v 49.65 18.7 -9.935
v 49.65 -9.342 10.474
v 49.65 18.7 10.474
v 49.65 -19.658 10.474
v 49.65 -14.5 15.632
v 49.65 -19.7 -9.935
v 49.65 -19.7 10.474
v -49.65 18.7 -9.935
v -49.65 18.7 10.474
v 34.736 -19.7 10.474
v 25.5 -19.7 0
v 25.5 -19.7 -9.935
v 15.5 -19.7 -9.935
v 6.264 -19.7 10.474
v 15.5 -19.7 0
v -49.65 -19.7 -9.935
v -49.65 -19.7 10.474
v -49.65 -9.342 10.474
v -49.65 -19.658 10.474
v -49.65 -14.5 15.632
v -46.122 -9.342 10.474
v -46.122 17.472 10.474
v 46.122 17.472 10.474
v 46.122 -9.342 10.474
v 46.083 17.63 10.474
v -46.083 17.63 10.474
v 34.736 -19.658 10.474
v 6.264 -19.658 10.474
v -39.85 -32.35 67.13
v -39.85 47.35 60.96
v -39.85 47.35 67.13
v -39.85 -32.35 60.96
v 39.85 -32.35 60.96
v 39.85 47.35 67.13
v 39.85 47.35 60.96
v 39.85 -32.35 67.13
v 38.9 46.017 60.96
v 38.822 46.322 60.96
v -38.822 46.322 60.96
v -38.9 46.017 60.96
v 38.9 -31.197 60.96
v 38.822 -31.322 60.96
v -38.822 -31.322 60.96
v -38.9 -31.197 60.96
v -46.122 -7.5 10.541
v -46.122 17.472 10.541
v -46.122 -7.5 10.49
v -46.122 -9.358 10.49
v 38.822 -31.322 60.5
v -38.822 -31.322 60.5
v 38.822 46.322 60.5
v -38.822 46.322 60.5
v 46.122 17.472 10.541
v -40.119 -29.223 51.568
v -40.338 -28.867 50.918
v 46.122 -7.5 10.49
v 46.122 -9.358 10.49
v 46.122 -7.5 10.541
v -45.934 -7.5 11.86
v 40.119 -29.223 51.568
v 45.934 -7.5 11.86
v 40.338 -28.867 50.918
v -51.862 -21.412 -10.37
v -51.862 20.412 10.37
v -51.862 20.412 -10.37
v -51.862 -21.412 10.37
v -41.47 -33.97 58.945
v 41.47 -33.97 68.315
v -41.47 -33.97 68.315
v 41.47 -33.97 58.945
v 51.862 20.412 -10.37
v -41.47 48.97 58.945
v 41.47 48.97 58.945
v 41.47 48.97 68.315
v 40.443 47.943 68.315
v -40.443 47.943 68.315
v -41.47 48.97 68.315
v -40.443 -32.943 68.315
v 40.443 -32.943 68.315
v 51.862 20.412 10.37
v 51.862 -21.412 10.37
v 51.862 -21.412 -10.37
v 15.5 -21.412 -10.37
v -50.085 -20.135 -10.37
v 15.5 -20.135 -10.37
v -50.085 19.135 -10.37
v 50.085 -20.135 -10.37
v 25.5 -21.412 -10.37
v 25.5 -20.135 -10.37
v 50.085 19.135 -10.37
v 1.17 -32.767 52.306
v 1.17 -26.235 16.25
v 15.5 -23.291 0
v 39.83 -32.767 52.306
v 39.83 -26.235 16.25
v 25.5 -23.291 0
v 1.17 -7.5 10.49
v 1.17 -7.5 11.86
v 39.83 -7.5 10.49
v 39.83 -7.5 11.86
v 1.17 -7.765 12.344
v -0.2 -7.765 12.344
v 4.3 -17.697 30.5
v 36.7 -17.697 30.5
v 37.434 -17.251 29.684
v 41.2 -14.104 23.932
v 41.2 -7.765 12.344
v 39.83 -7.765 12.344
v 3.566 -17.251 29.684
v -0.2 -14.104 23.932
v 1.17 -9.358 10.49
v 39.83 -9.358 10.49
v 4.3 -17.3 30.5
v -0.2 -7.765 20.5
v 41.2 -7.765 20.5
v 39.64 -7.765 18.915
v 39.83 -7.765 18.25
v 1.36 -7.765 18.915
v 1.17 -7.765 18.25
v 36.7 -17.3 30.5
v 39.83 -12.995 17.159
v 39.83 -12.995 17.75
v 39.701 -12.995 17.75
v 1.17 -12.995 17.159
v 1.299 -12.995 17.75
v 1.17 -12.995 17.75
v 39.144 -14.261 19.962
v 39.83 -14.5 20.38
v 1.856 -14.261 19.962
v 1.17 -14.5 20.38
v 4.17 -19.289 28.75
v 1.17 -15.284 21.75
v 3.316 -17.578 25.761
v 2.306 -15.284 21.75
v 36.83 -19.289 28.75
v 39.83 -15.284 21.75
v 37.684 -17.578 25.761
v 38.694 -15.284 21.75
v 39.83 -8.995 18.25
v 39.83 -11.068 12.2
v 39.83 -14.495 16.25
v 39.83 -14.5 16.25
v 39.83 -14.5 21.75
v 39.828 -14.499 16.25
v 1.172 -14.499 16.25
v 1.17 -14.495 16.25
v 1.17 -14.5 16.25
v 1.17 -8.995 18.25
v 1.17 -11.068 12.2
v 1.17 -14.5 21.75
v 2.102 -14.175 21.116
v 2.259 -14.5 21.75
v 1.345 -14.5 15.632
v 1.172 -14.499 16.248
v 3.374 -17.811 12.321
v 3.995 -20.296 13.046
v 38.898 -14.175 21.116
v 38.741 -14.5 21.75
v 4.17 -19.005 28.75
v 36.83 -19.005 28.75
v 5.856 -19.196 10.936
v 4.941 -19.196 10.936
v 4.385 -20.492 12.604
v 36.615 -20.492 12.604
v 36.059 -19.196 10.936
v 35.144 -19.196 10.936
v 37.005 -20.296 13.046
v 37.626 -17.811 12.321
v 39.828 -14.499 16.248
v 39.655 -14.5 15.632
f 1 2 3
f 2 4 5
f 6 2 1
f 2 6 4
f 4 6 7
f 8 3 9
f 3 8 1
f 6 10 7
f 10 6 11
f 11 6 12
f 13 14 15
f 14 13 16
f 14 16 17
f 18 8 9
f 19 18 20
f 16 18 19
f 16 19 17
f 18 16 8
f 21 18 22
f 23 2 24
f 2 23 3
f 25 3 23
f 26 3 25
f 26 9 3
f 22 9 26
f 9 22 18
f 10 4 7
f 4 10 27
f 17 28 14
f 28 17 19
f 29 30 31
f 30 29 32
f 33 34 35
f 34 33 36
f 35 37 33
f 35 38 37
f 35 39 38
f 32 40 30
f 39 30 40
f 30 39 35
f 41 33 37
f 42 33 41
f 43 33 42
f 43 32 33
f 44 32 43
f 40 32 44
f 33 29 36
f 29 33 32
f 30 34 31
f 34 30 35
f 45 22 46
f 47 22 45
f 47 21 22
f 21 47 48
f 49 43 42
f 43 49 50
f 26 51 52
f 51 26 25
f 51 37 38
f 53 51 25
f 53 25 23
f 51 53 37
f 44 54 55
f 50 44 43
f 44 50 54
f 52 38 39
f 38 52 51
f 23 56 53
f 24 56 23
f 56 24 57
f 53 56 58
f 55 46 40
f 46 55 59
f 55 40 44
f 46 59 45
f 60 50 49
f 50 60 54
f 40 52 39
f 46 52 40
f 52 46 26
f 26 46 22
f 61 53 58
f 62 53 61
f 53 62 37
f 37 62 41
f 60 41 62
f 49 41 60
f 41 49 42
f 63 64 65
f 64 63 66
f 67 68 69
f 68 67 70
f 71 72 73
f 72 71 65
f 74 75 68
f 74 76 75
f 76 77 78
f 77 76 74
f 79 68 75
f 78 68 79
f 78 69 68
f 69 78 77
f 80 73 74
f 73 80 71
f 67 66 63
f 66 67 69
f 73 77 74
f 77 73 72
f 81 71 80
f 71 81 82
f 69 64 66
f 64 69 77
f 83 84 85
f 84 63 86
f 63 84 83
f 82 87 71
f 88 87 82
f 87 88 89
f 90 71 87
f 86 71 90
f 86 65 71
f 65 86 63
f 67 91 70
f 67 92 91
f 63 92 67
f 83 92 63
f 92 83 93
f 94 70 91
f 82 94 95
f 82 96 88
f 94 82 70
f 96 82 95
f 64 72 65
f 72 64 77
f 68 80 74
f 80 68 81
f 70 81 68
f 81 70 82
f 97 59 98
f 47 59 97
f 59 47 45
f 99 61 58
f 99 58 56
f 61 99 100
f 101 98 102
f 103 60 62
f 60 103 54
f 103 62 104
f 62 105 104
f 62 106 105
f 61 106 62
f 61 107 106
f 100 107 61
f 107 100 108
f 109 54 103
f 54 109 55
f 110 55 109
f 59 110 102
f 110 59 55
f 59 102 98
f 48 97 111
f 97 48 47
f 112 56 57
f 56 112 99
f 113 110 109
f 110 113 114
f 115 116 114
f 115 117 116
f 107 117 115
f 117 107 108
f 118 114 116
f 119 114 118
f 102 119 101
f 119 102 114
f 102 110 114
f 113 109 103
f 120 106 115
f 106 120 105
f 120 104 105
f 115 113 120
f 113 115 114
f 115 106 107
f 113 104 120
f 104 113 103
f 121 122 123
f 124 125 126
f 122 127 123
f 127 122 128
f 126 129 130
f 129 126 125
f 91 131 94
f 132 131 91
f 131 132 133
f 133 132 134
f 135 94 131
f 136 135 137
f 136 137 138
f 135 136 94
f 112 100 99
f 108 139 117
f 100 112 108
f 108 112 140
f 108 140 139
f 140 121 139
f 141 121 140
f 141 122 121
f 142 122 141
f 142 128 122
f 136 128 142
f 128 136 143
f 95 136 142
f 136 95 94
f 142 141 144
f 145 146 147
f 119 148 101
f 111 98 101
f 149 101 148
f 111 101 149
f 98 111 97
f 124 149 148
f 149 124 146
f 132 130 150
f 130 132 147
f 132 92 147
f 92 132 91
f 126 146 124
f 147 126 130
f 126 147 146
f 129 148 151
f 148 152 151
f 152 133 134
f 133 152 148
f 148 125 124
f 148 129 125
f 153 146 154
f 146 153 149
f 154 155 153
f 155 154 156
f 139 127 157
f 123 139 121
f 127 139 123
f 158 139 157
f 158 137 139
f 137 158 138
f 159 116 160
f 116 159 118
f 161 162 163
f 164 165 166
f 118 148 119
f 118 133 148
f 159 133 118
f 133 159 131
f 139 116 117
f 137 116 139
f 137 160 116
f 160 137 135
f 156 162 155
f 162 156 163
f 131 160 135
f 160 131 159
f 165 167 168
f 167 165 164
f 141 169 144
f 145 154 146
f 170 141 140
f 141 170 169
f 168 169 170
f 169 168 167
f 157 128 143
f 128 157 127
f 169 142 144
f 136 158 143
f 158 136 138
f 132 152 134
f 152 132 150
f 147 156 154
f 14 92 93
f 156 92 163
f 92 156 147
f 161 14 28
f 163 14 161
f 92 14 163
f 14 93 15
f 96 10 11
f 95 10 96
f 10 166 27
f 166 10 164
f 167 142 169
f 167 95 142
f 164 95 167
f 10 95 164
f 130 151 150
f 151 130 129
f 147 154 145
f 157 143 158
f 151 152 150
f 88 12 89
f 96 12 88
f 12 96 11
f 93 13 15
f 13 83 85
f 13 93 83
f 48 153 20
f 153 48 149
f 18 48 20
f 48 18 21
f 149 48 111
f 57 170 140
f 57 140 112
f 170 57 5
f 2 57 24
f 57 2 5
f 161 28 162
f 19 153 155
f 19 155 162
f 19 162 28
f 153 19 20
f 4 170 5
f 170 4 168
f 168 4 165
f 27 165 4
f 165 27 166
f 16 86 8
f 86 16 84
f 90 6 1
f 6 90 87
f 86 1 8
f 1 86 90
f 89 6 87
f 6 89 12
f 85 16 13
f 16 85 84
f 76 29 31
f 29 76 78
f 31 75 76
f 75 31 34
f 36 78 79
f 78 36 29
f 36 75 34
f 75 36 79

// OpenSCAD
// v620 Multi-Fan Shroud
// By WolfOne_
//
// Print: 80mm rotates 180° (slot down). 40mm no rotation (fan face down).
// Card: use_v340l selects V340L slot sizing (V620 by default).

use_dual_40  		 = 0;   // 0=single 80mm, 1=dual 40mm (locks 90°, ignores others)
use_45deg    		 = 0;   // 0=off, 1=45° fan angle (80mm only)
use_60deg    		 = 0;   // 0=off, 1=60° fan angle (80mm only)
use_75deg    		 = 0;   // 0=off, 1=75° fan angle (80mm only)
use_90deg    		 = 1;   // 0=off, 1=90° fan angle (80mm only)
use_flip     		 = 0;   // 0=normal, 1=mirrored (80mm only)
use_cable_shroud = 1;   // 0=off, 1=shroud over cable opening
use_v340l        = 0;   // 0=V620 (tested), 1=V340L slot sizing

wallThickness = 1.37;

// Card slot (GPU fit)
// V620: as built, card-tested. V340L: the cavity grips the cooler shroud
// while the wider PCB edge passes through a relief band in the cavity wall
// (see Card opening).
v340l_cavityWidth  = 97;  // cavity width (cooler shroud grip)
v340l_cavityHeight = 39.3;  // cavity height (backplate face to slot top)
v340l_pcbWidth     = 98.8;  // PCB relief band width
v340l_pcbStart     = 2.6;   // PCB underside above backplate face
v340l_pcbThk       = 1.7;   // PCB thickness
v340l_pcbRelief    = 1.2;   // extra relief height around the PCB band (total)
v340l_ductTop      = 0.4;   // duct mouth: capture at the top edge
v340l_ductBottom   = 2.5;   // duct mouth: cut at the bottom edge

innerWidth  = use_v340l ? v340l_cavityWidth : 99.3;   // V620: measured 99.5, modeled 99.3
innerDepth  = 18;
innerHeight = use_v340l ? v340l_cavityHeight : 38.4;  // V620 cavity height

// Airflow duct (flow path only)
innerDuctWidth  = innerWidth - (use_v340l ? 1 : 5);   // V620: 94.3 (-5mm total / -2.5mm per side), V340L much thinner shroud
innerDuctHeight = innerHeight - 0.4   // V620: 38
    - (use_v340l ? v340l_ductBottom - v340l_ductTop : 0);  // V340L: mouth shortened at the bottom
ductLiftZ       = use_v340l ? (v340l_ductBottom + v340l_ductTop) / 2 : 0;  // duct mouth center lift

// Derived from flags
fan_size  = use_dual_40 ? 40 : 80;
fan_angle = use_dual_40 ? 90 : (use_90deg ? 90 : (use_75deg ? 75 : (use_60deg ? 60 : 45)));
use_steep = use_75deg || use_90deg;  // ramp adjustments for steep angles
flip      = use_dual_40 ? 0  : use_flip;

fanWidth = 79.7;

// Fan depth: 80mm=8, 40mm=20
fanHeight = use_dual_40 ? 14 : 8;

// Fan offset per angle.
fanOffSet = use_dual_40
    ? [0, -64, 0]
    : (use_90deg
        ? [0, -65,   8 * (flip == 0 ? 1 : -1)]   // 90°
        : (use_75deg
            ? [0, -65,   8 * (flip == 0 ? 1 : -1)]   // 75°
            : (use_60deg
                ? [0, -63,  12 * (flip == 0 ? 1 : -1)]   // 60°
                : [0,  -63,  10 * (flip == 0 ? 1 : -1)]))); // 45°

// Fan opening Y: 80mm=square, 40mm=half
fan_opening_y = use_dual_40 ? fanWidth / 2 : fanWidth;


wt_outer = wallThickness * 2.5;    // shell margin (width, height)
wt_depth = wallThickness * 2;      // shell margin (depth)
wt_gap   = wallThickness * 1.5;    // clearance gap (fan inner, ramp)

outerWidth  = innerWidth  + wt_outer + 1;
outerDepth  = innerDepth  + wt_depth;
outerHeight = innerHeight + wt_outer;

fanOuterWidth = fanWidth + wt_depth + 0.5;
fanInnerWidth = fanWidth - wt_gap;

pcie_8pin_x  = 20.5;                  // X offset from centerline
pcie_8pin_d  = [38.66, 11.5, 14];     // [width, depth, height]
pcie_8pin_db = [38.66, 1, 1];         // far-end stub

lowerRedirect  = [innerWidth, wallThickness, 14];
lowerRedirectB = use_dual_40
    ? [innerWidth - 3, 1, 1]
    : (use_steep
        ? [innerWidth - 3, 1, 1]   // 75°/90°: narrower
        : [innerWidth, 1, 1]);

print_rotation = use_dual_40 ? [90, 0, 0] : [-90, 0, 0];

function rotate_x(p, a) = [
    p.x,
    p.y * cos(a) - p.z * sin(a),
    p.y * sin(a) + p.z * cos(a)
];

fan_center_world = rotate_x(fanOffSet, fan_angle);

ramp_fraction   = use_dual_40 ? 0.035 : 0.28;
cutout_fraction = 0.35;

ramp_start_z   = -14;
ramp_start_y   = -innerDepth/2 - wt_gap - 0.12;
cutout_start_z = use_dual_40 ? -innerDepth/2 + 2 : -innerDepth/2 - 10;

ramp_end_z   = ramp_start_z   + (fan_center_world.z - ramp_start_z)   * ramp_fraction   - (use_steep ? 2 : 0);
cutout_end_z = cutout_start_z + (fan_center_world.z - cutout_start_z) * cutout_fraction - (use_steep ? 2 : 0);

card_chamfer_y = innerDepth/2 + wallThickness/2 + 0.75;
ramp_cutout_z  = -innerDepth/2 - 5;
flow_throat_z  = -wallThickness / 8 * 3;
fan_chamfer_z  = fanHeight/2 - wallThickness;

ramp_end_y = use_dual_40 ? -innerDepth - 34 : -innerDepth - 35;

duct_z_shift = -0.5;

rotate(print_rotation)
translate([0, 0, duct_z_shift])
difference(){
    union(){

        // Flow ramp (flip=0 only)
        if (flip == 0 && use_dual_40 == 0){
						hull(){
								translate([0, ramp_start_y, ramp_start_z])
										cube(lowerRedirect + [-2, 0, 0], center = true);
								translate([0, ramp_end_y, ramp_end_z])
										cube(lowerRedirectB - [8 + ( use_90deg == 1 ? 1 : 0), 0, 0], center = true);
						}
        }
        difference(){

					// Shell
					union(){
							hull(){
									cube([outerWidth, outerDepth, outerHeight], center = true);

									translate(fanOffSet)
									rotate([fan_angle, 0, 0])
									translate([0, 0, -wallThickness])
											cube([fanOuterWidth, use_dual_40 ? fanOuterWidth/2 + wallThickness : fanOuterWidth, fanHeight + wallThickness], center = true);
							}
					}

					// Cutouts
					union(){
					
						// Card opening
						cube([innerWidth, outerDepth * 1.01, innerHeight], center = true);

						// V340L PCB relief: local slot in the cavity wall across the PCB
						// band, so the wider PCB edge passes while the cooler shroud stays
						// clamped. Backplate side = -Z (same as the 8-pin cutout).
						if (use_v340l){
							translate([0, 0, -innerHeight/2 + v340l_pcbStart + v340l_pcbThk/2])
								cube([v340l_pcbWidth, outerDepth * 1.01, v340l_pcbThk + v340l_pcbRelief], center = true);
						}

						// Fan opening
						translate(fanOffSet)
						rotate([fan_angle, 0, 0])
								cube([fanWidth, fan_opening_y, fanHeight * 1.01], center = true);

						// Flow path
						if (use_dual_40 == 1){
							hull(){
								translate([0, -innerDepth/2 - wallThickness, flow_throat_z+6+ductLiftZ])
									cube([innerDuctWidth - wallThickness/2, wallThickness/4, innerDuctHeight - 12 + wallThickness/4] - [wallThickness, 0, wallThickness], center = true);
								translate(fanOffSet)
								rotate([fan_angle, 0, 0])
								translate([0, 0, -fanHeight/2])
								hull(){
									translate([-20, 0, 0])
										cylinder(h=1, r=19, center=true);
									translate([15, 0, 0])
										cylinder(h=1, r=4, center=true);
								}
							}
							hull(){
								translate([0, -innerDepth/2 - wallThickness, flow_throat_z+6+ductLiftZ])
									cube([innerDuctWidth - wallThickness/2, wallThickness/4, innerDuctHeight - 12 + wallThickness/4] - [wallThickness, 0, wallThickness], center = true);
								translate(fanOffSet)
								rotate([fan_angle, 0, 0])
								translate([0, 0, -fanHeight/2])
								hull(){
									translate([-15, 0, 0])
										cylinder(h=1, r=4, center=true);
									translate([20, 0, 0])
										cylinder(h=1, r=19, center=true);
								}
							}
						}
						else {
							hull(){
								if (flip == 0){
									translate([0, -innerDepth/2 - wallThickness, flow_throat_z+ductLiftZ])
										cube([innerDuctWidth - wallThickness/2, wallThickness/4, innerDuctHeight + wallThickness/4] - [wallThickness, 0, wallThickness], center = true);
								}
								else {
									translate([0, -innerDepth/2 - wallThickness*2, 5.5+ductLiftZ])
									cube([innerDuctWidth - wallThickness/2, wallThickness/4, innerDuctHeight + wallThickness/4] - [wallThickness, 0, 13], center = true);
								}

								translate(fanOffSet)
								rotate([fan_angle, 0, 0])
								translate([0, 0, -fanHeight/2])
									cube([fanInnerWidth, use_dual_40 ? fanInnerWidth/2 - 1 : fanInnerWidth, 1], center = true);
									
							}
							if (flip == 1){
								translate([0, -innerDepth/2 - wallThickness, 5.5+ductLiftZ])
									cube([innerDuctWidth - wallThickness/2, wallThickness*2, innerDuctHeight + wallThickness/4] - [wallThickness, 0, 13], center = true);
							}
						}
					}
				
        }
				
				// Cable Shroud		
				if (use_cable_shroud == 1)
				translate([0, (use_dual_40 == 1 ? -0.63 : 0), (use_v340l == 1 && use_dual_40 == 1 ? 2.5 : 0)])
				hull(){
						translate([pcie_8pin_x, -innerDepth - 12, -innerDepth/2 - 8.3 - (use_v340l == 1 && use_dual_40 == 0 ? 3 : 0)])
								cube(pcie_8pin_db + [-9+wallThickness*2, (use_v340l == 1 && use_dual_40 == 0 ? 10 : 0), 0], center = true);
						translate([pcie_8pin_x, -innerDepth + (use_dual_40 == 1 ? 2.75 : 2), -innerDepth/2 + 1.05])
								cube(pcie_8pin_db + [wallThickness*2, (use_dual_40 == 1 ? 9.75 : (use_v340l == 1 && use_dual_40 == 0 ? 11 : 8)), -1+wallThickness], center = true);
						translate([pcie_8pin_x, -innerDepth -2, -innerDepth/2 - 8])
								cube(pcie_8pin_db + [wallThickness*2, 10, 0], center = true);
				}
    }
    union(){
		
				// Cutaway (for thickness checks)
				//cube([20,200,200], center=true);

        // 45° ramp cutout
        cubert = (use_v340l == 1 ? 9.2 : 7.3);
        translate([0, -innerDepth/2 - wallThickness - 0.1, (use_v340l == 1 ? ramp_cutout_z + .8 : ramp_cutout_z)])
        rotate([45,0,0])
            cube([innerWidth, cubert, cubert], center = true);

        // Card chamfer
        translate([0, card_chamfer_y, 0])
        hull(){
                cube([innerWidth, 1, innerHeight], center = true);
                translate([0, wallThickness/2, 0])
                cube([innerWidth, 1, innerHeight] + [wallThickness, 0, wallThickness], center = true);
        }

        // 8-pin slots
        if (flip == 0){
				
						// Cable Channels
						if (use_dual_40 == 1){
							hull(){
								translate([pcie_8pin_x + 11, -innerDepth + 6, -innerDepth/2 - 20])
									cube(pcie_8pin_d + [200, -10, 0.01], center = true);
								translate([pcie_8pin_x + 10, -innerDepth - 4.55, -innerDepth/2 - (use_v340l == 1 ? 10 : 12)])
									cube(pcie_8pin_d + [200, -11, 1.764], center = true);
								translate([pcie_8pin_x + 10, -innerDepth - 52, cutout_end_z])
									cube(pcie_8pin_db + [200, 4, 4], center = true);
							}
						}
						else {							
							hull(){
									translate([pcie_8pin_x, -innerDepth + 1, -innerDepth/2 - 12 - (use_75deg == 1 || use_90deg == 1 ? 1 : 0)])
											cube(pcie_8pin_d + [0, -10, 5.01], center = true);
									translate([pcie_8pin_x, -innerDepth - 44, cutout_end_z - (use_75deg == 1 || use_90deg == 1 ? 1.5 : 0)])
											cube(pcie_8pin_db, center = true);
							}
						}
            // PCIE 8 Pin x 2 Connector Clearance
						translate([0, 0, 2])
            hull(){
                translate([pcie_8pin_x, -innerDepth + 1.5, -innerDepth/2 - 5])
                    cube(pcie_8pin_d + [0, -11, -10.01], center = true);
                translate([pcie_8pin_x, -innerDepth + 4, -innerDepth/2 - 0.5])
                    cube(pcie_8pin_d + [0, -3, (use_v340l == 1 ? -8.01 : -12.01)], center = true);
								translate([pcie_8pin_x, -innerDepth + 4.5, -innerDepth/2 - 5])
                    cube(pcie_8pin_d + [-9, -2, -4.01], center = true);
								translate([pcie_8pin_x, -innerDepth-3 - (use_v340l == 1 ? 5 : 0), -innerDepth/2 - 11 - (use_v340l == 1 ? 1 : 0) - (use_75deg == 1 || use_90deg == 1 ? 1.5 : 0)])
                    cube(pcie_8pin_d + [-6, 4, -12.01], center = true);
            }
            translate([0, -6, 0])
            hull(){
                translate([pcie_8pin_x, -innerDepth + 5, -innerDepth/2 - 12])
                    cube(pcie_8pin_d + [0, -6, 0], center = true);
                translate([pcie_8pin_x, 0, -innerDepth])
                    cube([10,12,innerDepth], center = true);
            }
            translate([pcie_8pin_x, 0, -innerDepth])
                cube([10,25,innerDepth], center = true);
        }
        else {
            // flip=1 cutout
            hull(){
                translate([pcie_8pin_x, -innerDepth + 0, -innerDepth/2])
                        cube(pcie_8pin_d + [-4, 8, 0], center = true);
                translate([pcie_8pin_x, 5, -innerDepth])
                    cube([10,20,innerDepth-2], center = true);
            }
        }

        // Fan chamfer
        translate(fanOffSet)
        rotate([fan_angle, 0, 0])
        translate([0, 0, fan_chamfer_z])
            hull(){
                cube([fanWidth, fan_opening_y, 1], center = true);
                translate([0, 0, wallThickness])
                cube([fanWidth + wallThickness, use_dual_40 ? fanWidth/2 + wallThickness : fanWidth + wallThickness, 1], center = true);
            }
    }
}
